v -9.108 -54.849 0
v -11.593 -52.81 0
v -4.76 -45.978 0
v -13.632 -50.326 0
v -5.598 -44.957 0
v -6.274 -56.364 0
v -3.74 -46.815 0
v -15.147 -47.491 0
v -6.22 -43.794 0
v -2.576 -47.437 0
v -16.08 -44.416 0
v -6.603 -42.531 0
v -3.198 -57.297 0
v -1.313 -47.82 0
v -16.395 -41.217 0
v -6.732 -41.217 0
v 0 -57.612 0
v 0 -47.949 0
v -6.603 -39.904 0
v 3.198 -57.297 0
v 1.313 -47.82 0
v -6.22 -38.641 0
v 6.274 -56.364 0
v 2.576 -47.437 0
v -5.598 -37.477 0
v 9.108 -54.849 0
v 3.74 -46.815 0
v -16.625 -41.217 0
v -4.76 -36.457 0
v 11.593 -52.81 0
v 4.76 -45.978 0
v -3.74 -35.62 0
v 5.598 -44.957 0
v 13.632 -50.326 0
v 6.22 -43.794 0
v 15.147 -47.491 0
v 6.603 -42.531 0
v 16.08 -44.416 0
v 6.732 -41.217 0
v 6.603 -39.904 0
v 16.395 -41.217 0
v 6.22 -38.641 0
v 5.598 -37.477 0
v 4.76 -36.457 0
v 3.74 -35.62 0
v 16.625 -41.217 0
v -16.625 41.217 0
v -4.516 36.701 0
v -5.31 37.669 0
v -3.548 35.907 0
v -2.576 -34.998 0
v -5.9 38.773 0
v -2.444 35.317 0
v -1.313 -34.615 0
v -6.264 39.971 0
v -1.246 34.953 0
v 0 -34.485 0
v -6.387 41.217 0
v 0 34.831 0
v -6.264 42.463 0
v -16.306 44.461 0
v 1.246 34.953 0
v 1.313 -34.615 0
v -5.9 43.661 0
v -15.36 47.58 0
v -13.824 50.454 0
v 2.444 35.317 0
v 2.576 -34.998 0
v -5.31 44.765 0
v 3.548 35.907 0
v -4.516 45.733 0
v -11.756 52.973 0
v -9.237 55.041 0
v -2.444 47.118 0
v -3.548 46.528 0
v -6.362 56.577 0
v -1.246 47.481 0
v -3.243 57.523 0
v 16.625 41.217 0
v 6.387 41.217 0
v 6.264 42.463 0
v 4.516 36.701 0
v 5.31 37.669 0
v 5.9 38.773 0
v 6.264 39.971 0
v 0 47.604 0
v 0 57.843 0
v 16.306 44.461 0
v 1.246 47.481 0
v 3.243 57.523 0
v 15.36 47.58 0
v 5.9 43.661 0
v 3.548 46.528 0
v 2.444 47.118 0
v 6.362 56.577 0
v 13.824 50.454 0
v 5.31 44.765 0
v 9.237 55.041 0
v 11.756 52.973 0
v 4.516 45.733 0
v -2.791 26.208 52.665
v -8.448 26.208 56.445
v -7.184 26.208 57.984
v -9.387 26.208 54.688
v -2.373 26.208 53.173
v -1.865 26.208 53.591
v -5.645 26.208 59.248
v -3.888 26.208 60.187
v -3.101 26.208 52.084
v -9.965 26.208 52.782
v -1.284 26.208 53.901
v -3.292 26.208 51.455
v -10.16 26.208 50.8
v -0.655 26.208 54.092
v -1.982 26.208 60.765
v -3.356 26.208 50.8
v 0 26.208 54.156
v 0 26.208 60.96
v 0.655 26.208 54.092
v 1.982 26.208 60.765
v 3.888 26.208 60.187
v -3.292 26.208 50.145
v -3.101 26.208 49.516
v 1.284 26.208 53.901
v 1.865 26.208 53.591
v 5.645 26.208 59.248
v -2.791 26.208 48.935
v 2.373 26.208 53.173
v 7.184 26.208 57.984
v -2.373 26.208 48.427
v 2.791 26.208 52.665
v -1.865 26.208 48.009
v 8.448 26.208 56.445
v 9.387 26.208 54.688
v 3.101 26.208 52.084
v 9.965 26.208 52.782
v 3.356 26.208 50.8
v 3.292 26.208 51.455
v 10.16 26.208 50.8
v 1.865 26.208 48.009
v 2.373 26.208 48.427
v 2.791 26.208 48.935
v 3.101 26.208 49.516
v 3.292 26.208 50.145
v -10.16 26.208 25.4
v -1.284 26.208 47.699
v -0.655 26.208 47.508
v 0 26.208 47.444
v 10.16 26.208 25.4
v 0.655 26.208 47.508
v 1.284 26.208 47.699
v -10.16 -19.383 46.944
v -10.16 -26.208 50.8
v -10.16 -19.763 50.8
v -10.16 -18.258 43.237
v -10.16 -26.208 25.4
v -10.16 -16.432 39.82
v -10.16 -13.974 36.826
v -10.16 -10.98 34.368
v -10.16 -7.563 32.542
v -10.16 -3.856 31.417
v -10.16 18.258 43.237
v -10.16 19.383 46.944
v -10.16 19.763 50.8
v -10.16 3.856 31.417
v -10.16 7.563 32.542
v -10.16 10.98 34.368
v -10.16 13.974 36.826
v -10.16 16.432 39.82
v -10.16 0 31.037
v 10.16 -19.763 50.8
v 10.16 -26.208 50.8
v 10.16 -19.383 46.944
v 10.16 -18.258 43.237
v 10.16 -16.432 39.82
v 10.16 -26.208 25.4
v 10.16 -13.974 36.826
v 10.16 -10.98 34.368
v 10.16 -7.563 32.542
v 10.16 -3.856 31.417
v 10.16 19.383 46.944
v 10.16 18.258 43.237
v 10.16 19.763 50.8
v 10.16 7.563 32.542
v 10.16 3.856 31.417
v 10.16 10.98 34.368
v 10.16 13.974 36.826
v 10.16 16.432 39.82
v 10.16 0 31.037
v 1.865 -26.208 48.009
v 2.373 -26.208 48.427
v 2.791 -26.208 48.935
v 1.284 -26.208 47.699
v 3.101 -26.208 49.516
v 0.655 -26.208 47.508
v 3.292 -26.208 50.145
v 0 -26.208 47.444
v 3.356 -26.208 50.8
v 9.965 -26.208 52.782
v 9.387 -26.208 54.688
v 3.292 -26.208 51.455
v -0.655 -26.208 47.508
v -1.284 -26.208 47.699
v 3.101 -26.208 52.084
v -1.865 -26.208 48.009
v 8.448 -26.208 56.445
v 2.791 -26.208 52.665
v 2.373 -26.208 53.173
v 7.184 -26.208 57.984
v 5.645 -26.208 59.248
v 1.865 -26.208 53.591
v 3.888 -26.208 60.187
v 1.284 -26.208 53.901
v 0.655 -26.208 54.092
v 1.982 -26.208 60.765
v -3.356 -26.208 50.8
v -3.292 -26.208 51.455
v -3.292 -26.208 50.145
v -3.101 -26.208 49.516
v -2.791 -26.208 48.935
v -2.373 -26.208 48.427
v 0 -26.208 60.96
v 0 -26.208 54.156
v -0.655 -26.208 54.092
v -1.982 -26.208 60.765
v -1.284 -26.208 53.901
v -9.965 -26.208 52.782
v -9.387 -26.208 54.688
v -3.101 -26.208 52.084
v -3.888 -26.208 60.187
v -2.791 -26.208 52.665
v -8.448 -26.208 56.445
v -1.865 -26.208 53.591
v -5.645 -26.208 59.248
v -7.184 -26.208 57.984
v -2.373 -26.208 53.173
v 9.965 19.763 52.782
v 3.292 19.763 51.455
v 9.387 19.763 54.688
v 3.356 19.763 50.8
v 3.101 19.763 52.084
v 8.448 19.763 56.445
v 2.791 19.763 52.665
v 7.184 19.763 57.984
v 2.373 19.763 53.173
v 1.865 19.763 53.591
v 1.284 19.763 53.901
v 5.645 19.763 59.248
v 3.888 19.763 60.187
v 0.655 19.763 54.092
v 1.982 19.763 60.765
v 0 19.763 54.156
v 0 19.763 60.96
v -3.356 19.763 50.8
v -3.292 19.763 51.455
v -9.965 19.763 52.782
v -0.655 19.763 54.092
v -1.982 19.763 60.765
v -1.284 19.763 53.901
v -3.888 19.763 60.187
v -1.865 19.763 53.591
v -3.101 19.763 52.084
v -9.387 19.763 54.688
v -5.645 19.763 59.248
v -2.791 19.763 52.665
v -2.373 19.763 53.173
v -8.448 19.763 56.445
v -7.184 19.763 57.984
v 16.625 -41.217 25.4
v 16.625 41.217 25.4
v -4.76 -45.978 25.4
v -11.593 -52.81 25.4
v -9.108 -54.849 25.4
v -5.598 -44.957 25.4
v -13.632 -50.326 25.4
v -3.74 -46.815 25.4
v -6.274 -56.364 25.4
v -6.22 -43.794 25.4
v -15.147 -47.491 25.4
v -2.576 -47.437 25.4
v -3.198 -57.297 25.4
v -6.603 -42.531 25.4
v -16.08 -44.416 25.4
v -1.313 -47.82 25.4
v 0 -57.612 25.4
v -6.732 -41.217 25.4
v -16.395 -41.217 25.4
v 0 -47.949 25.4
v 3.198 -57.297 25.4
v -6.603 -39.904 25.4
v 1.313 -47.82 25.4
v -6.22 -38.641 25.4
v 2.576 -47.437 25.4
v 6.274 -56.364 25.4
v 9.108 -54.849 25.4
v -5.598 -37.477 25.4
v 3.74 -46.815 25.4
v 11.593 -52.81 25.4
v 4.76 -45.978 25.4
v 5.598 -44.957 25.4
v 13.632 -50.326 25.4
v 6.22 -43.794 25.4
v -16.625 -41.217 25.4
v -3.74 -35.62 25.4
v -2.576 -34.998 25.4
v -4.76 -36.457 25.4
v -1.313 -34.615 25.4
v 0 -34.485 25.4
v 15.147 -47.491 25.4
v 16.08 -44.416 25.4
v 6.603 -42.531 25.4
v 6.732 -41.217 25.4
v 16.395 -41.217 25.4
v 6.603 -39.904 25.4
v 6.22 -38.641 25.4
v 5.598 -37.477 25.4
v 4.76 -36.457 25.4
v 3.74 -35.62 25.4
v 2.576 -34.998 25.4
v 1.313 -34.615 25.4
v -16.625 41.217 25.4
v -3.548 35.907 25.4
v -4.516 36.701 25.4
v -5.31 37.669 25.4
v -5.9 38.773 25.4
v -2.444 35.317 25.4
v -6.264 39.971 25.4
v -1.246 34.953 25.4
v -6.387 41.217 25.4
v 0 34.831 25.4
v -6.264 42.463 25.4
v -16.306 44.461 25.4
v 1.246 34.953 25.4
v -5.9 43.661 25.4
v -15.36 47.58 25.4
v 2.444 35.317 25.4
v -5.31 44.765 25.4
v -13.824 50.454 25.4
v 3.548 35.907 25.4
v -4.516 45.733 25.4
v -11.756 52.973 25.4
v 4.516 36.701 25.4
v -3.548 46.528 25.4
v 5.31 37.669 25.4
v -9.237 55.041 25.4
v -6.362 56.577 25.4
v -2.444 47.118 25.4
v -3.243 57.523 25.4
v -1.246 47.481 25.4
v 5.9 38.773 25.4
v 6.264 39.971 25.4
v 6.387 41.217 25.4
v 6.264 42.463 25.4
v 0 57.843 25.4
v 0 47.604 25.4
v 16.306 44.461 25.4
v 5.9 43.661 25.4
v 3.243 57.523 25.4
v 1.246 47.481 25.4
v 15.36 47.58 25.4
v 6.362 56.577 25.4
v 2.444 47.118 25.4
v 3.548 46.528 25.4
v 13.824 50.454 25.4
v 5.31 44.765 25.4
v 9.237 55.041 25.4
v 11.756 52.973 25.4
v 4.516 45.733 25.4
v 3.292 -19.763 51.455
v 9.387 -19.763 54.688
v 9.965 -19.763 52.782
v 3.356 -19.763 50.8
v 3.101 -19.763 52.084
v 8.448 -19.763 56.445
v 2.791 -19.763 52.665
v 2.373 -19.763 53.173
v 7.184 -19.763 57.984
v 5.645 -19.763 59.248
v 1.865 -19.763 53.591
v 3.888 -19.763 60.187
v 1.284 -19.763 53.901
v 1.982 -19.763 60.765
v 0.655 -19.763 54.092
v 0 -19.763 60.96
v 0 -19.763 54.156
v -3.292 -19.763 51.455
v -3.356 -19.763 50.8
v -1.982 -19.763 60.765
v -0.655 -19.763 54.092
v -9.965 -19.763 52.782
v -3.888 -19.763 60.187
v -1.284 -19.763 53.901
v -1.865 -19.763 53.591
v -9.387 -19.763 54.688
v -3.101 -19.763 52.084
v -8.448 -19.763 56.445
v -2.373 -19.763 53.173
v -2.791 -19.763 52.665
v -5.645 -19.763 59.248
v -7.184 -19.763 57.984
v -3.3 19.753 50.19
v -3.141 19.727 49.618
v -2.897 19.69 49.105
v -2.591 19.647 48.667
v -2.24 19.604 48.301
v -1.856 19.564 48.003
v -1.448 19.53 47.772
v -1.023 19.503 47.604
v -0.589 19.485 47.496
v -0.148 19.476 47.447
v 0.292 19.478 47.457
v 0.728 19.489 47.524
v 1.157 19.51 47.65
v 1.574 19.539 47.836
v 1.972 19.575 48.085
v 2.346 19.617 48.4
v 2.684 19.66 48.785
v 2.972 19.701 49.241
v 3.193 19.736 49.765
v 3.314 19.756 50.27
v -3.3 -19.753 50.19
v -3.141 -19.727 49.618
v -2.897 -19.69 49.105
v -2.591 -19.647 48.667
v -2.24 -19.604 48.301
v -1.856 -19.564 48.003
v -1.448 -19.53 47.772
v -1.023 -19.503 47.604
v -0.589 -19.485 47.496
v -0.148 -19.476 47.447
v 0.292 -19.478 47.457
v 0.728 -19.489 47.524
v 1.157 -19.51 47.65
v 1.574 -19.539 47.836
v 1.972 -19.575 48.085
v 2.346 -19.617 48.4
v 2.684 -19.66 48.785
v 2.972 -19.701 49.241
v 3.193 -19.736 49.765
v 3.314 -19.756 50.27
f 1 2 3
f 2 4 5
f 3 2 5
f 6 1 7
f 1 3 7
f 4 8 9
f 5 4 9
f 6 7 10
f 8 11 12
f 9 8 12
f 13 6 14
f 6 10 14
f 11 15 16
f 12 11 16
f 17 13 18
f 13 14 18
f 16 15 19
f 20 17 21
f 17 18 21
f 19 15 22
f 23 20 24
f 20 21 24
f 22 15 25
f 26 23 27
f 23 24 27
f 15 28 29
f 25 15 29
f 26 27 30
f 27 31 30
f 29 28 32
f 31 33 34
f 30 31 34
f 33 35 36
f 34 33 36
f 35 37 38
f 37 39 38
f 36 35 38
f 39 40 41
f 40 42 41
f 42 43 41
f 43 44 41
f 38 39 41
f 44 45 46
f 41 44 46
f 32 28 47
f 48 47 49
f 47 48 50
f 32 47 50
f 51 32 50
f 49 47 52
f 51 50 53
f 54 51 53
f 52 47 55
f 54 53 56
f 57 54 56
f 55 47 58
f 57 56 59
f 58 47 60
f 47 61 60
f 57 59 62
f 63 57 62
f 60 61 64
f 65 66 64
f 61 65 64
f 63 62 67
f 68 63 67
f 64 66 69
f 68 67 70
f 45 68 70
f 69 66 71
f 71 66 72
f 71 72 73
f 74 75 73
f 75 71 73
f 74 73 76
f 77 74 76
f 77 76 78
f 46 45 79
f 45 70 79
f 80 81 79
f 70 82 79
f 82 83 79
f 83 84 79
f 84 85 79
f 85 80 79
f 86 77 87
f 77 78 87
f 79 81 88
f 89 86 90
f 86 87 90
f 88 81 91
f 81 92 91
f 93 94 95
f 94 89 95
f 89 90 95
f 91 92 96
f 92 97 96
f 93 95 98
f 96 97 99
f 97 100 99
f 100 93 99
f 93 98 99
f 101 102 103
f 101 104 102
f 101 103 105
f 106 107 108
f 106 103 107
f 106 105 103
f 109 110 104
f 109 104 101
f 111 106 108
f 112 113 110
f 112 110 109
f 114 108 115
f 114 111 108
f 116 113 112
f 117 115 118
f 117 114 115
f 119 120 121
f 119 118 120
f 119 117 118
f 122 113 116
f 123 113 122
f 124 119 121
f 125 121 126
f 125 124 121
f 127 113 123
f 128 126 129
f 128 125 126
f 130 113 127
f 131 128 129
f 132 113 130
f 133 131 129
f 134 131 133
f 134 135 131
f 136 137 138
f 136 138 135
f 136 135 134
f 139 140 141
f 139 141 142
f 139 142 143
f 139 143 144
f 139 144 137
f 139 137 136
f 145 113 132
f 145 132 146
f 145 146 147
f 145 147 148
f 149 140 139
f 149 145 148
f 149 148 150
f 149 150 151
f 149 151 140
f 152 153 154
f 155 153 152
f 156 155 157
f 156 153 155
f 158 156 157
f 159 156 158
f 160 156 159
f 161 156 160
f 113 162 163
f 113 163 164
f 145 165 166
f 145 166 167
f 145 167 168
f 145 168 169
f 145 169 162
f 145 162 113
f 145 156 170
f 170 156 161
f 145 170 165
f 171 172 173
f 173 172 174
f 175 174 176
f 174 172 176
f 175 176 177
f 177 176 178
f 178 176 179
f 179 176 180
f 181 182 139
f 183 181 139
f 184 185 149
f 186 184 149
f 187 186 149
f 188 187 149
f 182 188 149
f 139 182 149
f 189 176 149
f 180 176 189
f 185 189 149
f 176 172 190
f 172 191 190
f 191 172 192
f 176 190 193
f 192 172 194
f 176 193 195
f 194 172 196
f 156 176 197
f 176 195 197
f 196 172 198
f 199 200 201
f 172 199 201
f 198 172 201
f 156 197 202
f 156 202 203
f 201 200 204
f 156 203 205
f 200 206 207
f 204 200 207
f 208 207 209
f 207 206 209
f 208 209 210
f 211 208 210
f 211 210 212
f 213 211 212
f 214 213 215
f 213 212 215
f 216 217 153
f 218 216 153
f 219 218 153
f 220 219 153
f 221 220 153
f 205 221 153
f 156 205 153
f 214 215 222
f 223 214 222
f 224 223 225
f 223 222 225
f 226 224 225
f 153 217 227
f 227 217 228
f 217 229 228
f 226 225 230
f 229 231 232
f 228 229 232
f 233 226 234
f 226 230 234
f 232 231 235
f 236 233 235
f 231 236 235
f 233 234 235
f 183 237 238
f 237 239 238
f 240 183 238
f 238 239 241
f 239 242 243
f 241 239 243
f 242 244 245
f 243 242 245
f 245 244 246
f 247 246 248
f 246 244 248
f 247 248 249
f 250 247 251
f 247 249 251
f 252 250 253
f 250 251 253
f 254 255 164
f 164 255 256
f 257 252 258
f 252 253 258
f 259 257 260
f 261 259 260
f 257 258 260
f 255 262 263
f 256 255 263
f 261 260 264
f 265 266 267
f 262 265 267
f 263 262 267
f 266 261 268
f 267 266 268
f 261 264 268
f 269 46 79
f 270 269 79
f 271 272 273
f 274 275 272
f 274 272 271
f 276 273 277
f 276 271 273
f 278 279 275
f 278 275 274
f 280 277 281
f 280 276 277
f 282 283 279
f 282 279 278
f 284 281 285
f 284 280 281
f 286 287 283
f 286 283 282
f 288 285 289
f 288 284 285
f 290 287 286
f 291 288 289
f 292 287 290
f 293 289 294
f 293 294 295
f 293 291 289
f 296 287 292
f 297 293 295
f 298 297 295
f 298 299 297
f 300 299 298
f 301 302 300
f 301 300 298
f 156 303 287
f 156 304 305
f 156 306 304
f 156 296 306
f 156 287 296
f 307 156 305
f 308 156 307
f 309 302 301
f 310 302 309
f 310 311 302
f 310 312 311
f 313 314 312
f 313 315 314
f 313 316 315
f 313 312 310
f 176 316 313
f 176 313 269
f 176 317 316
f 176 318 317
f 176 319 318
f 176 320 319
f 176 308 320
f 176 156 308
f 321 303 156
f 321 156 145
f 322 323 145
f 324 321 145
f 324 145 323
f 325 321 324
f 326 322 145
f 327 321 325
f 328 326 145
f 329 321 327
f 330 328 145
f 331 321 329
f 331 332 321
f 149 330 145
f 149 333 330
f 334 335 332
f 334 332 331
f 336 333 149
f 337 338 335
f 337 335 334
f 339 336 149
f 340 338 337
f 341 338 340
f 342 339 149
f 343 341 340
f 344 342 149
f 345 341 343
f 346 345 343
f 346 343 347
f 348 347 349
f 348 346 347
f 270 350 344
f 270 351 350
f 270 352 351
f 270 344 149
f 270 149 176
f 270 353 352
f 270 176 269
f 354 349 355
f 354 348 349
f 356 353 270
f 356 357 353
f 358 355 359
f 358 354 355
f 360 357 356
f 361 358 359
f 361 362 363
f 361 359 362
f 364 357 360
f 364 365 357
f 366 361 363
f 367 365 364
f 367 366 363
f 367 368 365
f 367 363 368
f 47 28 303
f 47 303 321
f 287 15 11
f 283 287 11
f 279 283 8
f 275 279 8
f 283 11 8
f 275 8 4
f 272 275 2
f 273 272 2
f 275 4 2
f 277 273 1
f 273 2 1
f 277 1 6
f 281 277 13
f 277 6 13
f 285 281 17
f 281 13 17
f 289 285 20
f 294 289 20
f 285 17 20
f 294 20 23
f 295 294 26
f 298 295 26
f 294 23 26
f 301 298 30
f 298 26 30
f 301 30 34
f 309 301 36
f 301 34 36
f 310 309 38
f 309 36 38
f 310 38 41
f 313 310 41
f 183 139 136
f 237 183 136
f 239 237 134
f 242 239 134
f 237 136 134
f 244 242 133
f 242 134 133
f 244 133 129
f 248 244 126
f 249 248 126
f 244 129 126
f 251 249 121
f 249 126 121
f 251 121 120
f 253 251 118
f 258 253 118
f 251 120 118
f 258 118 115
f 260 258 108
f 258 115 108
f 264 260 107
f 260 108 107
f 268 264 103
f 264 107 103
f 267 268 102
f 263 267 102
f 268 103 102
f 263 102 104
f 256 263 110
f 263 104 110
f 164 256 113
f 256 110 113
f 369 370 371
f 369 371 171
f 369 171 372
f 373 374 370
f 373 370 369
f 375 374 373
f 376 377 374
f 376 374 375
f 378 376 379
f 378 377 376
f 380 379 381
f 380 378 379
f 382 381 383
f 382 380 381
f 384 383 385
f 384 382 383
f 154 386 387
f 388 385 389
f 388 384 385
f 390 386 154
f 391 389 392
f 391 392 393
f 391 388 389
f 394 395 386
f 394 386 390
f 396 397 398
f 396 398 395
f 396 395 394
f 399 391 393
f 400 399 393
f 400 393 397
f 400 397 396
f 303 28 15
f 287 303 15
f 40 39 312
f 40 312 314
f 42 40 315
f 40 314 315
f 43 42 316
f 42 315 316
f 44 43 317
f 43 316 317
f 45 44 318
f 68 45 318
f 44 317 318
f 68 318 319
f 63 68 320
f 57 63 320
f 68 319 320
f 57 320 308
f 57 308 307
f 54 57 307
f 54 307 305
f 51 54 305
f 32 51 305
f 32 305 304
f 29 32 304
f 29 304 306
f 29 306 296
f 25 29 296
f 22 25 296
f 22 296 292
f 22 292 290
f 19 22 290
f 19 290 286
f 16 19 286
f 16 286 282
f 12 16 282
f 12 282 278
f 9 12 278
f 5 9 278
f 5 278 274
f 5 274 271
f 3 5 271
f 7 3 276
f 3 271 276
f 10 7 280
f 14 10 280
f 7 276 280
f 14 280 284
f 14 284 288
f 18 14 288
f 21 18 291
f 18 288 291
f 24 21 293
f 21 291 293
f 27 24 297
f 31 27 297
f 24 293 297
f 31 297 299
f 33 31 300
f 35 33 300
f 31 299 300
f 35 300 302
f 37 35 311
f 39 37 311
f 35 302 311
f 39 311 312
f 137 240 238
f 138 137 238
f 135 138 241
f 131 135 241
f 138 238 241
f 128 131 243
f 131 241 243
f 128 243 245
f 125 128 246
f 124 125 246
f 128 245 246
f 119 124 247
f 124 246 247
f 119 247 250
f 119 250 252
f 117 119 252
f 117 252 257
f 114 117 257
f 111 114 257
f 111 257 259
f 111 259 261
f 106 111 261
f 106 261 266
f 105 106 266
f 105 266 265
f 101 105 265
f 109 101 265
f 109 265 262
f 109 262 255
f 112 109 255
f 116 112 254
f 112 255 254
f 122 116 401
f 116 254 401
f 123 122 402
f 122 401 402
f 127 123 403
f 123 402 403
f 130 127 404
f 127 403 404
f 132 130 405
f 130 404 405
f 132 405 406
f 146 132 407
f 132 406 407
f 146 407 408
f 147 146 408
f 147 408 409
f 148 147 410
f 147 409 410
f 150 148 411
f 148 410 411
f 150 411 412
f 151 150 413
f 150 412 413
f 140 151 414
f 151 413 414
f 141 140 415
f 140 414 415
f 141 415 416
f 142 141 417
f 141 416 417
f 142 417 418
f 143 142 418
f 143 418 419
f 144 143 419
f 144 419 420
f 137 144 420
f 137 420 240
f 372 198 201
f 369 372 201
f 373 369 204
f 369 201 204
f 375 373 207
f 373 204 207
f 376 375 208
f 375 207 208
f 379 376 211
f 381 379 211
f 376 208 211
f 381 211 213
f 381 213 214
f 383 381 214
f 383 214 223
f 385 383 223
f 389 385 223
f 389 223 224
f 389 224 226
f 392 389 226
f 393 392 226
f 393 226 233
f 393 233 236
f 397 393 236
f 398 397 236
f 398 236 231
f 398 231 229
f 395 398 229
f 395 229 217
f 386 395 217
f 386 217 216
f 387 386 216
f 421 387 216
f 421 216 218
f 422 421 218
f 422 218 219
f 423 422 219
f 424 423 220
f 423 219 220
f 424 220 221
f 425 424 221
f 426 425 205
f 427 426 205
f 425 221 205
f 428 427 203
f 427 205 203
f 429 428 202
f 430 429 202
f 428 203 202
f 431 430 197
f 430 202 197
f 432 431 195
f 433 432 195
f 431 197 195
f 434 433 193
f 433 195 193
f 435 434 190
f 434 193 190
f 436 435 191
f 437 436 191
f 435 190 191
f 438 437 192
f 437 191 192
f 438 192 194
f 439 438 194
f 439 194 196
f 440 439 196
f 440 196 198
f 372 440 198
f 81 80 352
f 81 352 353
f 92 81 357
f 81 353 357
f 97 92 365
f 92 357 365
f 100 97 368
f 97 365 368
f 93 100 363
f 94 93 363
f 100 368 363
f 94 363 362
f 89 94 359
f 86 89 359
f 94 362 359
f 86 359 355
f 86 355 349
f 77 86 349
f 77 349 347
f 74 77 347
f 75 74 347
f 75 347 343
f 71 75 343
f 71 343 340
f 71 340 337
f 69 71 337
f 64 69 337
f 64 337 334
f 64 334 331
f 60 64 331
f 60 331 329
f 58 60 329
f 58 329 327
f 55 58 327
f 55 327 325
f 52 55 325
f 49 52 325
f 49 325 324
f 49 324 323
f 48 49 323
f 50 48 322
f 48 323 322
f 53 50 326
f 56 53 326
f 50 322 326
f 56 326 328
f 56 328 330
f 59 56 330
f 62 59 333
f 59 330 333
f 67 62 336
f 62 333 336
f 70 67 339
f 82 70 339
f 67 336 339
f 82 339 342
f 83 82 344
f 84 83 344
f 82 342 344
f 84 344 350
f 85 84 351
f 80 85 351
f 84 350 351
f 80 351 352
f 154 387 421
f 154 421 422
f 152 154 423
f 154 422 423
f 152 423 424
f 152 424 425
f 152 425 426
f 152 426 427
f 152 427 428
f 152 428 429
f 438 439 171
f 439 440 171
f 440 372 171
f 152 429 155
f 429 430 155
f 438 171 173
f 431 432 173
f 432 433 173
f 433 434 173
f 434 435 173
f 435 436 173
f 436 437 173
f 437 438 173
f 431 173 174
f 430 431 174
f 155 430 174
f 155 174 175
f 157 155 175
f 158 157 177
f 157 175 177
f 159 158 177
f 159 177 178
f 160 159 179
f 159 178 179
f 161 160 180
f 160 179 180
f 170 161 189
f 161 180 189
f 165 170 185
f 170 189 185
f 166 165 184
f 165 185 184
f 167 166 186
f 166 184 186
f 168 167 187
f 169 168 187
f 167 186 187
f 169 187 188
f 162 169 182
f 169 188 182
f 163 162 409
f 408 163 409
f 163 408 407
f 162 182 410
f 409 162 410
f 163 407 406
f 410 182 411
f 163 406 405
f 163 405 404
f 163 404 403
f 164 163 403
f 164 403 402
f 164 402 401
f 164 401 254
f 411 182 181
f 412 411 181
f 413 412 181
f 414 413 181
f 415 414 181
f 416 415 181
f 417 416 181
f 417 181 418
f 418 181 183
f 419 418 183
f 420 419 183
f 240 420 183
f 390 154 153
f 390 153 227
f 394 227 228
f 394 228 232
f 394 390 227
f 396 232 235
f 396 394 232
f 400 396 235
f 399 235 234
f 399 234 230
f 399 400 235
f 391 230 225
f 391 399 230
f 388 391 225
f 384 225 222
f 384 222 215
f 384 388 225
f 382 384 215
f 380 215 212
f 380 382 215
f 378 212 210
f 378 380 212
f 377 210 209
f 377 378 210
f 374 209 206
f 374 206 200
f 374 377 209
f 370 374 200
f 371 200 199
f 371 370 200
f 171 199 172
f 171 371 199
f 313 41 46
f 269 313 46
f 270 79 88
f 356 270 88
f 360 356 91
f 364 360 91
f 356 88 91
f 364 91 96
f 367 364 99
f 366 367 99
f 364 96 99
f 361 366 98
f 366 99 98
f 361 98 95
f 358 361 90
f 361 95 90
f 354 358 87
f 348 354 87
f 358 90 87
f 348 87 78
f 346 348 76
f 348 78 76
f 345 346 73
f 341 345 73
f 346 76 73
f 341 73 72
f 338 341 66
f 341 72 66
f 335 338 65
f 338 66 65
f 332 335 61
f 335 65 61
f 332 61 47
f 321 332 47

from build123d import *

# Parameters (mm, degrees)
F0_W      = 33.25091
F0_H      = 82.434542
F3_DEPTH  = 25.4
F1_R      = 16.625455
F4_DEPTH  = 25.4
F2_R      = 16.394546
F5_DEPTH  = 25.4
F6_R      = 6.38663
F6_R_2    = 6.732099
F7_DEPTH  = 25.401
F8_W      = 20.32
F8_H      = 52.416362
F9_DEPTH  = 50.8
F11_DEPTH = 26.786455
F12_W     = 10.16
F12_H     = 6.445338
F14_W     = 10.16
F14_H     = 6.445338
F16_R     = 3.356131
F17_DEPTH = 84.051907


with BuildPart() as f3:
    # F0 (on Top) → F3 (new body)
    with BuildSketch(Plane.XY):
        Rectangle(F0_W, F0_H)
    extrude(amount=F3_DEPTH)

    # F1 (on Top) → F4 (join)
    with BuildSketch(Plane.XY):
        with Locations((0, 41.217271)):
            Circle(F1_R)
    extrude(amount=F4_DEPTH)

    # F2 (on Top) → F5 (join)
    with BuildSketch(Plane.XY):
        with Locations((0, -41.217271)):
            Circle(F2_R)
    extrude(amount=F5_DEPTH)

    # F6 (on face) → F7 (cut, through all)
    with BuildSketch(Plane.XY.offset(25.4)):
        with Locations((0, 41.217271)):
            Circle(F6_R)
        with Locations((0, -41.217271)):
            Circle(F6_R_2)
    extrude(amount=-F7_DEPTH, mode=Mode.SUBTRACT)

    # F8 (on Top) → F9 (join)
    with BuildSketch(Plane.XY):
        Rectangle(F8_W, F8_H)
    extrude(amount=F9_DEPTH)

    # F10 (on face) → F11 (cut, through all)
    with BuildSketch(Plane.YZ.offset(10.16)):
        with BuildLine():
            Line((-19.762843, 50.8), (19.762843, 50.8))
            ThreePointArc((19.762843, 50.8), (0, 70.562843), (-19.762843, 50.8))
        make_face()
        with BuildLine():
            ThreePointArc((-19.762843, 50.8), (0, 31.037157), (19.762843, 50.8))
            Line((19.762843, 50.8), (-19.762843, 50.8))
        make_face()
    extrude(amount=-F11_DEPTH, mode=Mode.SUBTRACT)

    # F12 (on face) → F13 (revolve)
    with BuildSketch(Plane.XY.offset(50.8)):
        with Locations((5.08, 22.985512)):
            Rectangle(F12_W, F12_H)
    revolve(axis=Axis((0, 22.985512, 50.8), (0, -1, 0)))

    # F14 (on face) → F15 (revolve)
    with BuildSketch(Plane.XY.offset(50.8)):
        with Locations((-5.08, -22.985512)):
            Rectangle(F14_W, F14_H)
    revolve(axis=Axis((0, -22.985512, 50.8), (0, 1, 0)))

    # F16 (on face) → F17 (cut, through all)
    with BuildSketch(Plane.XZ.offset(26.208181)):
        with Locations((0, 50.8)):
            Circle(F16_R)
    extrude(amount=-F17_DEPTH, mode=Mode.SUBTRACT)


solid = f3.part
